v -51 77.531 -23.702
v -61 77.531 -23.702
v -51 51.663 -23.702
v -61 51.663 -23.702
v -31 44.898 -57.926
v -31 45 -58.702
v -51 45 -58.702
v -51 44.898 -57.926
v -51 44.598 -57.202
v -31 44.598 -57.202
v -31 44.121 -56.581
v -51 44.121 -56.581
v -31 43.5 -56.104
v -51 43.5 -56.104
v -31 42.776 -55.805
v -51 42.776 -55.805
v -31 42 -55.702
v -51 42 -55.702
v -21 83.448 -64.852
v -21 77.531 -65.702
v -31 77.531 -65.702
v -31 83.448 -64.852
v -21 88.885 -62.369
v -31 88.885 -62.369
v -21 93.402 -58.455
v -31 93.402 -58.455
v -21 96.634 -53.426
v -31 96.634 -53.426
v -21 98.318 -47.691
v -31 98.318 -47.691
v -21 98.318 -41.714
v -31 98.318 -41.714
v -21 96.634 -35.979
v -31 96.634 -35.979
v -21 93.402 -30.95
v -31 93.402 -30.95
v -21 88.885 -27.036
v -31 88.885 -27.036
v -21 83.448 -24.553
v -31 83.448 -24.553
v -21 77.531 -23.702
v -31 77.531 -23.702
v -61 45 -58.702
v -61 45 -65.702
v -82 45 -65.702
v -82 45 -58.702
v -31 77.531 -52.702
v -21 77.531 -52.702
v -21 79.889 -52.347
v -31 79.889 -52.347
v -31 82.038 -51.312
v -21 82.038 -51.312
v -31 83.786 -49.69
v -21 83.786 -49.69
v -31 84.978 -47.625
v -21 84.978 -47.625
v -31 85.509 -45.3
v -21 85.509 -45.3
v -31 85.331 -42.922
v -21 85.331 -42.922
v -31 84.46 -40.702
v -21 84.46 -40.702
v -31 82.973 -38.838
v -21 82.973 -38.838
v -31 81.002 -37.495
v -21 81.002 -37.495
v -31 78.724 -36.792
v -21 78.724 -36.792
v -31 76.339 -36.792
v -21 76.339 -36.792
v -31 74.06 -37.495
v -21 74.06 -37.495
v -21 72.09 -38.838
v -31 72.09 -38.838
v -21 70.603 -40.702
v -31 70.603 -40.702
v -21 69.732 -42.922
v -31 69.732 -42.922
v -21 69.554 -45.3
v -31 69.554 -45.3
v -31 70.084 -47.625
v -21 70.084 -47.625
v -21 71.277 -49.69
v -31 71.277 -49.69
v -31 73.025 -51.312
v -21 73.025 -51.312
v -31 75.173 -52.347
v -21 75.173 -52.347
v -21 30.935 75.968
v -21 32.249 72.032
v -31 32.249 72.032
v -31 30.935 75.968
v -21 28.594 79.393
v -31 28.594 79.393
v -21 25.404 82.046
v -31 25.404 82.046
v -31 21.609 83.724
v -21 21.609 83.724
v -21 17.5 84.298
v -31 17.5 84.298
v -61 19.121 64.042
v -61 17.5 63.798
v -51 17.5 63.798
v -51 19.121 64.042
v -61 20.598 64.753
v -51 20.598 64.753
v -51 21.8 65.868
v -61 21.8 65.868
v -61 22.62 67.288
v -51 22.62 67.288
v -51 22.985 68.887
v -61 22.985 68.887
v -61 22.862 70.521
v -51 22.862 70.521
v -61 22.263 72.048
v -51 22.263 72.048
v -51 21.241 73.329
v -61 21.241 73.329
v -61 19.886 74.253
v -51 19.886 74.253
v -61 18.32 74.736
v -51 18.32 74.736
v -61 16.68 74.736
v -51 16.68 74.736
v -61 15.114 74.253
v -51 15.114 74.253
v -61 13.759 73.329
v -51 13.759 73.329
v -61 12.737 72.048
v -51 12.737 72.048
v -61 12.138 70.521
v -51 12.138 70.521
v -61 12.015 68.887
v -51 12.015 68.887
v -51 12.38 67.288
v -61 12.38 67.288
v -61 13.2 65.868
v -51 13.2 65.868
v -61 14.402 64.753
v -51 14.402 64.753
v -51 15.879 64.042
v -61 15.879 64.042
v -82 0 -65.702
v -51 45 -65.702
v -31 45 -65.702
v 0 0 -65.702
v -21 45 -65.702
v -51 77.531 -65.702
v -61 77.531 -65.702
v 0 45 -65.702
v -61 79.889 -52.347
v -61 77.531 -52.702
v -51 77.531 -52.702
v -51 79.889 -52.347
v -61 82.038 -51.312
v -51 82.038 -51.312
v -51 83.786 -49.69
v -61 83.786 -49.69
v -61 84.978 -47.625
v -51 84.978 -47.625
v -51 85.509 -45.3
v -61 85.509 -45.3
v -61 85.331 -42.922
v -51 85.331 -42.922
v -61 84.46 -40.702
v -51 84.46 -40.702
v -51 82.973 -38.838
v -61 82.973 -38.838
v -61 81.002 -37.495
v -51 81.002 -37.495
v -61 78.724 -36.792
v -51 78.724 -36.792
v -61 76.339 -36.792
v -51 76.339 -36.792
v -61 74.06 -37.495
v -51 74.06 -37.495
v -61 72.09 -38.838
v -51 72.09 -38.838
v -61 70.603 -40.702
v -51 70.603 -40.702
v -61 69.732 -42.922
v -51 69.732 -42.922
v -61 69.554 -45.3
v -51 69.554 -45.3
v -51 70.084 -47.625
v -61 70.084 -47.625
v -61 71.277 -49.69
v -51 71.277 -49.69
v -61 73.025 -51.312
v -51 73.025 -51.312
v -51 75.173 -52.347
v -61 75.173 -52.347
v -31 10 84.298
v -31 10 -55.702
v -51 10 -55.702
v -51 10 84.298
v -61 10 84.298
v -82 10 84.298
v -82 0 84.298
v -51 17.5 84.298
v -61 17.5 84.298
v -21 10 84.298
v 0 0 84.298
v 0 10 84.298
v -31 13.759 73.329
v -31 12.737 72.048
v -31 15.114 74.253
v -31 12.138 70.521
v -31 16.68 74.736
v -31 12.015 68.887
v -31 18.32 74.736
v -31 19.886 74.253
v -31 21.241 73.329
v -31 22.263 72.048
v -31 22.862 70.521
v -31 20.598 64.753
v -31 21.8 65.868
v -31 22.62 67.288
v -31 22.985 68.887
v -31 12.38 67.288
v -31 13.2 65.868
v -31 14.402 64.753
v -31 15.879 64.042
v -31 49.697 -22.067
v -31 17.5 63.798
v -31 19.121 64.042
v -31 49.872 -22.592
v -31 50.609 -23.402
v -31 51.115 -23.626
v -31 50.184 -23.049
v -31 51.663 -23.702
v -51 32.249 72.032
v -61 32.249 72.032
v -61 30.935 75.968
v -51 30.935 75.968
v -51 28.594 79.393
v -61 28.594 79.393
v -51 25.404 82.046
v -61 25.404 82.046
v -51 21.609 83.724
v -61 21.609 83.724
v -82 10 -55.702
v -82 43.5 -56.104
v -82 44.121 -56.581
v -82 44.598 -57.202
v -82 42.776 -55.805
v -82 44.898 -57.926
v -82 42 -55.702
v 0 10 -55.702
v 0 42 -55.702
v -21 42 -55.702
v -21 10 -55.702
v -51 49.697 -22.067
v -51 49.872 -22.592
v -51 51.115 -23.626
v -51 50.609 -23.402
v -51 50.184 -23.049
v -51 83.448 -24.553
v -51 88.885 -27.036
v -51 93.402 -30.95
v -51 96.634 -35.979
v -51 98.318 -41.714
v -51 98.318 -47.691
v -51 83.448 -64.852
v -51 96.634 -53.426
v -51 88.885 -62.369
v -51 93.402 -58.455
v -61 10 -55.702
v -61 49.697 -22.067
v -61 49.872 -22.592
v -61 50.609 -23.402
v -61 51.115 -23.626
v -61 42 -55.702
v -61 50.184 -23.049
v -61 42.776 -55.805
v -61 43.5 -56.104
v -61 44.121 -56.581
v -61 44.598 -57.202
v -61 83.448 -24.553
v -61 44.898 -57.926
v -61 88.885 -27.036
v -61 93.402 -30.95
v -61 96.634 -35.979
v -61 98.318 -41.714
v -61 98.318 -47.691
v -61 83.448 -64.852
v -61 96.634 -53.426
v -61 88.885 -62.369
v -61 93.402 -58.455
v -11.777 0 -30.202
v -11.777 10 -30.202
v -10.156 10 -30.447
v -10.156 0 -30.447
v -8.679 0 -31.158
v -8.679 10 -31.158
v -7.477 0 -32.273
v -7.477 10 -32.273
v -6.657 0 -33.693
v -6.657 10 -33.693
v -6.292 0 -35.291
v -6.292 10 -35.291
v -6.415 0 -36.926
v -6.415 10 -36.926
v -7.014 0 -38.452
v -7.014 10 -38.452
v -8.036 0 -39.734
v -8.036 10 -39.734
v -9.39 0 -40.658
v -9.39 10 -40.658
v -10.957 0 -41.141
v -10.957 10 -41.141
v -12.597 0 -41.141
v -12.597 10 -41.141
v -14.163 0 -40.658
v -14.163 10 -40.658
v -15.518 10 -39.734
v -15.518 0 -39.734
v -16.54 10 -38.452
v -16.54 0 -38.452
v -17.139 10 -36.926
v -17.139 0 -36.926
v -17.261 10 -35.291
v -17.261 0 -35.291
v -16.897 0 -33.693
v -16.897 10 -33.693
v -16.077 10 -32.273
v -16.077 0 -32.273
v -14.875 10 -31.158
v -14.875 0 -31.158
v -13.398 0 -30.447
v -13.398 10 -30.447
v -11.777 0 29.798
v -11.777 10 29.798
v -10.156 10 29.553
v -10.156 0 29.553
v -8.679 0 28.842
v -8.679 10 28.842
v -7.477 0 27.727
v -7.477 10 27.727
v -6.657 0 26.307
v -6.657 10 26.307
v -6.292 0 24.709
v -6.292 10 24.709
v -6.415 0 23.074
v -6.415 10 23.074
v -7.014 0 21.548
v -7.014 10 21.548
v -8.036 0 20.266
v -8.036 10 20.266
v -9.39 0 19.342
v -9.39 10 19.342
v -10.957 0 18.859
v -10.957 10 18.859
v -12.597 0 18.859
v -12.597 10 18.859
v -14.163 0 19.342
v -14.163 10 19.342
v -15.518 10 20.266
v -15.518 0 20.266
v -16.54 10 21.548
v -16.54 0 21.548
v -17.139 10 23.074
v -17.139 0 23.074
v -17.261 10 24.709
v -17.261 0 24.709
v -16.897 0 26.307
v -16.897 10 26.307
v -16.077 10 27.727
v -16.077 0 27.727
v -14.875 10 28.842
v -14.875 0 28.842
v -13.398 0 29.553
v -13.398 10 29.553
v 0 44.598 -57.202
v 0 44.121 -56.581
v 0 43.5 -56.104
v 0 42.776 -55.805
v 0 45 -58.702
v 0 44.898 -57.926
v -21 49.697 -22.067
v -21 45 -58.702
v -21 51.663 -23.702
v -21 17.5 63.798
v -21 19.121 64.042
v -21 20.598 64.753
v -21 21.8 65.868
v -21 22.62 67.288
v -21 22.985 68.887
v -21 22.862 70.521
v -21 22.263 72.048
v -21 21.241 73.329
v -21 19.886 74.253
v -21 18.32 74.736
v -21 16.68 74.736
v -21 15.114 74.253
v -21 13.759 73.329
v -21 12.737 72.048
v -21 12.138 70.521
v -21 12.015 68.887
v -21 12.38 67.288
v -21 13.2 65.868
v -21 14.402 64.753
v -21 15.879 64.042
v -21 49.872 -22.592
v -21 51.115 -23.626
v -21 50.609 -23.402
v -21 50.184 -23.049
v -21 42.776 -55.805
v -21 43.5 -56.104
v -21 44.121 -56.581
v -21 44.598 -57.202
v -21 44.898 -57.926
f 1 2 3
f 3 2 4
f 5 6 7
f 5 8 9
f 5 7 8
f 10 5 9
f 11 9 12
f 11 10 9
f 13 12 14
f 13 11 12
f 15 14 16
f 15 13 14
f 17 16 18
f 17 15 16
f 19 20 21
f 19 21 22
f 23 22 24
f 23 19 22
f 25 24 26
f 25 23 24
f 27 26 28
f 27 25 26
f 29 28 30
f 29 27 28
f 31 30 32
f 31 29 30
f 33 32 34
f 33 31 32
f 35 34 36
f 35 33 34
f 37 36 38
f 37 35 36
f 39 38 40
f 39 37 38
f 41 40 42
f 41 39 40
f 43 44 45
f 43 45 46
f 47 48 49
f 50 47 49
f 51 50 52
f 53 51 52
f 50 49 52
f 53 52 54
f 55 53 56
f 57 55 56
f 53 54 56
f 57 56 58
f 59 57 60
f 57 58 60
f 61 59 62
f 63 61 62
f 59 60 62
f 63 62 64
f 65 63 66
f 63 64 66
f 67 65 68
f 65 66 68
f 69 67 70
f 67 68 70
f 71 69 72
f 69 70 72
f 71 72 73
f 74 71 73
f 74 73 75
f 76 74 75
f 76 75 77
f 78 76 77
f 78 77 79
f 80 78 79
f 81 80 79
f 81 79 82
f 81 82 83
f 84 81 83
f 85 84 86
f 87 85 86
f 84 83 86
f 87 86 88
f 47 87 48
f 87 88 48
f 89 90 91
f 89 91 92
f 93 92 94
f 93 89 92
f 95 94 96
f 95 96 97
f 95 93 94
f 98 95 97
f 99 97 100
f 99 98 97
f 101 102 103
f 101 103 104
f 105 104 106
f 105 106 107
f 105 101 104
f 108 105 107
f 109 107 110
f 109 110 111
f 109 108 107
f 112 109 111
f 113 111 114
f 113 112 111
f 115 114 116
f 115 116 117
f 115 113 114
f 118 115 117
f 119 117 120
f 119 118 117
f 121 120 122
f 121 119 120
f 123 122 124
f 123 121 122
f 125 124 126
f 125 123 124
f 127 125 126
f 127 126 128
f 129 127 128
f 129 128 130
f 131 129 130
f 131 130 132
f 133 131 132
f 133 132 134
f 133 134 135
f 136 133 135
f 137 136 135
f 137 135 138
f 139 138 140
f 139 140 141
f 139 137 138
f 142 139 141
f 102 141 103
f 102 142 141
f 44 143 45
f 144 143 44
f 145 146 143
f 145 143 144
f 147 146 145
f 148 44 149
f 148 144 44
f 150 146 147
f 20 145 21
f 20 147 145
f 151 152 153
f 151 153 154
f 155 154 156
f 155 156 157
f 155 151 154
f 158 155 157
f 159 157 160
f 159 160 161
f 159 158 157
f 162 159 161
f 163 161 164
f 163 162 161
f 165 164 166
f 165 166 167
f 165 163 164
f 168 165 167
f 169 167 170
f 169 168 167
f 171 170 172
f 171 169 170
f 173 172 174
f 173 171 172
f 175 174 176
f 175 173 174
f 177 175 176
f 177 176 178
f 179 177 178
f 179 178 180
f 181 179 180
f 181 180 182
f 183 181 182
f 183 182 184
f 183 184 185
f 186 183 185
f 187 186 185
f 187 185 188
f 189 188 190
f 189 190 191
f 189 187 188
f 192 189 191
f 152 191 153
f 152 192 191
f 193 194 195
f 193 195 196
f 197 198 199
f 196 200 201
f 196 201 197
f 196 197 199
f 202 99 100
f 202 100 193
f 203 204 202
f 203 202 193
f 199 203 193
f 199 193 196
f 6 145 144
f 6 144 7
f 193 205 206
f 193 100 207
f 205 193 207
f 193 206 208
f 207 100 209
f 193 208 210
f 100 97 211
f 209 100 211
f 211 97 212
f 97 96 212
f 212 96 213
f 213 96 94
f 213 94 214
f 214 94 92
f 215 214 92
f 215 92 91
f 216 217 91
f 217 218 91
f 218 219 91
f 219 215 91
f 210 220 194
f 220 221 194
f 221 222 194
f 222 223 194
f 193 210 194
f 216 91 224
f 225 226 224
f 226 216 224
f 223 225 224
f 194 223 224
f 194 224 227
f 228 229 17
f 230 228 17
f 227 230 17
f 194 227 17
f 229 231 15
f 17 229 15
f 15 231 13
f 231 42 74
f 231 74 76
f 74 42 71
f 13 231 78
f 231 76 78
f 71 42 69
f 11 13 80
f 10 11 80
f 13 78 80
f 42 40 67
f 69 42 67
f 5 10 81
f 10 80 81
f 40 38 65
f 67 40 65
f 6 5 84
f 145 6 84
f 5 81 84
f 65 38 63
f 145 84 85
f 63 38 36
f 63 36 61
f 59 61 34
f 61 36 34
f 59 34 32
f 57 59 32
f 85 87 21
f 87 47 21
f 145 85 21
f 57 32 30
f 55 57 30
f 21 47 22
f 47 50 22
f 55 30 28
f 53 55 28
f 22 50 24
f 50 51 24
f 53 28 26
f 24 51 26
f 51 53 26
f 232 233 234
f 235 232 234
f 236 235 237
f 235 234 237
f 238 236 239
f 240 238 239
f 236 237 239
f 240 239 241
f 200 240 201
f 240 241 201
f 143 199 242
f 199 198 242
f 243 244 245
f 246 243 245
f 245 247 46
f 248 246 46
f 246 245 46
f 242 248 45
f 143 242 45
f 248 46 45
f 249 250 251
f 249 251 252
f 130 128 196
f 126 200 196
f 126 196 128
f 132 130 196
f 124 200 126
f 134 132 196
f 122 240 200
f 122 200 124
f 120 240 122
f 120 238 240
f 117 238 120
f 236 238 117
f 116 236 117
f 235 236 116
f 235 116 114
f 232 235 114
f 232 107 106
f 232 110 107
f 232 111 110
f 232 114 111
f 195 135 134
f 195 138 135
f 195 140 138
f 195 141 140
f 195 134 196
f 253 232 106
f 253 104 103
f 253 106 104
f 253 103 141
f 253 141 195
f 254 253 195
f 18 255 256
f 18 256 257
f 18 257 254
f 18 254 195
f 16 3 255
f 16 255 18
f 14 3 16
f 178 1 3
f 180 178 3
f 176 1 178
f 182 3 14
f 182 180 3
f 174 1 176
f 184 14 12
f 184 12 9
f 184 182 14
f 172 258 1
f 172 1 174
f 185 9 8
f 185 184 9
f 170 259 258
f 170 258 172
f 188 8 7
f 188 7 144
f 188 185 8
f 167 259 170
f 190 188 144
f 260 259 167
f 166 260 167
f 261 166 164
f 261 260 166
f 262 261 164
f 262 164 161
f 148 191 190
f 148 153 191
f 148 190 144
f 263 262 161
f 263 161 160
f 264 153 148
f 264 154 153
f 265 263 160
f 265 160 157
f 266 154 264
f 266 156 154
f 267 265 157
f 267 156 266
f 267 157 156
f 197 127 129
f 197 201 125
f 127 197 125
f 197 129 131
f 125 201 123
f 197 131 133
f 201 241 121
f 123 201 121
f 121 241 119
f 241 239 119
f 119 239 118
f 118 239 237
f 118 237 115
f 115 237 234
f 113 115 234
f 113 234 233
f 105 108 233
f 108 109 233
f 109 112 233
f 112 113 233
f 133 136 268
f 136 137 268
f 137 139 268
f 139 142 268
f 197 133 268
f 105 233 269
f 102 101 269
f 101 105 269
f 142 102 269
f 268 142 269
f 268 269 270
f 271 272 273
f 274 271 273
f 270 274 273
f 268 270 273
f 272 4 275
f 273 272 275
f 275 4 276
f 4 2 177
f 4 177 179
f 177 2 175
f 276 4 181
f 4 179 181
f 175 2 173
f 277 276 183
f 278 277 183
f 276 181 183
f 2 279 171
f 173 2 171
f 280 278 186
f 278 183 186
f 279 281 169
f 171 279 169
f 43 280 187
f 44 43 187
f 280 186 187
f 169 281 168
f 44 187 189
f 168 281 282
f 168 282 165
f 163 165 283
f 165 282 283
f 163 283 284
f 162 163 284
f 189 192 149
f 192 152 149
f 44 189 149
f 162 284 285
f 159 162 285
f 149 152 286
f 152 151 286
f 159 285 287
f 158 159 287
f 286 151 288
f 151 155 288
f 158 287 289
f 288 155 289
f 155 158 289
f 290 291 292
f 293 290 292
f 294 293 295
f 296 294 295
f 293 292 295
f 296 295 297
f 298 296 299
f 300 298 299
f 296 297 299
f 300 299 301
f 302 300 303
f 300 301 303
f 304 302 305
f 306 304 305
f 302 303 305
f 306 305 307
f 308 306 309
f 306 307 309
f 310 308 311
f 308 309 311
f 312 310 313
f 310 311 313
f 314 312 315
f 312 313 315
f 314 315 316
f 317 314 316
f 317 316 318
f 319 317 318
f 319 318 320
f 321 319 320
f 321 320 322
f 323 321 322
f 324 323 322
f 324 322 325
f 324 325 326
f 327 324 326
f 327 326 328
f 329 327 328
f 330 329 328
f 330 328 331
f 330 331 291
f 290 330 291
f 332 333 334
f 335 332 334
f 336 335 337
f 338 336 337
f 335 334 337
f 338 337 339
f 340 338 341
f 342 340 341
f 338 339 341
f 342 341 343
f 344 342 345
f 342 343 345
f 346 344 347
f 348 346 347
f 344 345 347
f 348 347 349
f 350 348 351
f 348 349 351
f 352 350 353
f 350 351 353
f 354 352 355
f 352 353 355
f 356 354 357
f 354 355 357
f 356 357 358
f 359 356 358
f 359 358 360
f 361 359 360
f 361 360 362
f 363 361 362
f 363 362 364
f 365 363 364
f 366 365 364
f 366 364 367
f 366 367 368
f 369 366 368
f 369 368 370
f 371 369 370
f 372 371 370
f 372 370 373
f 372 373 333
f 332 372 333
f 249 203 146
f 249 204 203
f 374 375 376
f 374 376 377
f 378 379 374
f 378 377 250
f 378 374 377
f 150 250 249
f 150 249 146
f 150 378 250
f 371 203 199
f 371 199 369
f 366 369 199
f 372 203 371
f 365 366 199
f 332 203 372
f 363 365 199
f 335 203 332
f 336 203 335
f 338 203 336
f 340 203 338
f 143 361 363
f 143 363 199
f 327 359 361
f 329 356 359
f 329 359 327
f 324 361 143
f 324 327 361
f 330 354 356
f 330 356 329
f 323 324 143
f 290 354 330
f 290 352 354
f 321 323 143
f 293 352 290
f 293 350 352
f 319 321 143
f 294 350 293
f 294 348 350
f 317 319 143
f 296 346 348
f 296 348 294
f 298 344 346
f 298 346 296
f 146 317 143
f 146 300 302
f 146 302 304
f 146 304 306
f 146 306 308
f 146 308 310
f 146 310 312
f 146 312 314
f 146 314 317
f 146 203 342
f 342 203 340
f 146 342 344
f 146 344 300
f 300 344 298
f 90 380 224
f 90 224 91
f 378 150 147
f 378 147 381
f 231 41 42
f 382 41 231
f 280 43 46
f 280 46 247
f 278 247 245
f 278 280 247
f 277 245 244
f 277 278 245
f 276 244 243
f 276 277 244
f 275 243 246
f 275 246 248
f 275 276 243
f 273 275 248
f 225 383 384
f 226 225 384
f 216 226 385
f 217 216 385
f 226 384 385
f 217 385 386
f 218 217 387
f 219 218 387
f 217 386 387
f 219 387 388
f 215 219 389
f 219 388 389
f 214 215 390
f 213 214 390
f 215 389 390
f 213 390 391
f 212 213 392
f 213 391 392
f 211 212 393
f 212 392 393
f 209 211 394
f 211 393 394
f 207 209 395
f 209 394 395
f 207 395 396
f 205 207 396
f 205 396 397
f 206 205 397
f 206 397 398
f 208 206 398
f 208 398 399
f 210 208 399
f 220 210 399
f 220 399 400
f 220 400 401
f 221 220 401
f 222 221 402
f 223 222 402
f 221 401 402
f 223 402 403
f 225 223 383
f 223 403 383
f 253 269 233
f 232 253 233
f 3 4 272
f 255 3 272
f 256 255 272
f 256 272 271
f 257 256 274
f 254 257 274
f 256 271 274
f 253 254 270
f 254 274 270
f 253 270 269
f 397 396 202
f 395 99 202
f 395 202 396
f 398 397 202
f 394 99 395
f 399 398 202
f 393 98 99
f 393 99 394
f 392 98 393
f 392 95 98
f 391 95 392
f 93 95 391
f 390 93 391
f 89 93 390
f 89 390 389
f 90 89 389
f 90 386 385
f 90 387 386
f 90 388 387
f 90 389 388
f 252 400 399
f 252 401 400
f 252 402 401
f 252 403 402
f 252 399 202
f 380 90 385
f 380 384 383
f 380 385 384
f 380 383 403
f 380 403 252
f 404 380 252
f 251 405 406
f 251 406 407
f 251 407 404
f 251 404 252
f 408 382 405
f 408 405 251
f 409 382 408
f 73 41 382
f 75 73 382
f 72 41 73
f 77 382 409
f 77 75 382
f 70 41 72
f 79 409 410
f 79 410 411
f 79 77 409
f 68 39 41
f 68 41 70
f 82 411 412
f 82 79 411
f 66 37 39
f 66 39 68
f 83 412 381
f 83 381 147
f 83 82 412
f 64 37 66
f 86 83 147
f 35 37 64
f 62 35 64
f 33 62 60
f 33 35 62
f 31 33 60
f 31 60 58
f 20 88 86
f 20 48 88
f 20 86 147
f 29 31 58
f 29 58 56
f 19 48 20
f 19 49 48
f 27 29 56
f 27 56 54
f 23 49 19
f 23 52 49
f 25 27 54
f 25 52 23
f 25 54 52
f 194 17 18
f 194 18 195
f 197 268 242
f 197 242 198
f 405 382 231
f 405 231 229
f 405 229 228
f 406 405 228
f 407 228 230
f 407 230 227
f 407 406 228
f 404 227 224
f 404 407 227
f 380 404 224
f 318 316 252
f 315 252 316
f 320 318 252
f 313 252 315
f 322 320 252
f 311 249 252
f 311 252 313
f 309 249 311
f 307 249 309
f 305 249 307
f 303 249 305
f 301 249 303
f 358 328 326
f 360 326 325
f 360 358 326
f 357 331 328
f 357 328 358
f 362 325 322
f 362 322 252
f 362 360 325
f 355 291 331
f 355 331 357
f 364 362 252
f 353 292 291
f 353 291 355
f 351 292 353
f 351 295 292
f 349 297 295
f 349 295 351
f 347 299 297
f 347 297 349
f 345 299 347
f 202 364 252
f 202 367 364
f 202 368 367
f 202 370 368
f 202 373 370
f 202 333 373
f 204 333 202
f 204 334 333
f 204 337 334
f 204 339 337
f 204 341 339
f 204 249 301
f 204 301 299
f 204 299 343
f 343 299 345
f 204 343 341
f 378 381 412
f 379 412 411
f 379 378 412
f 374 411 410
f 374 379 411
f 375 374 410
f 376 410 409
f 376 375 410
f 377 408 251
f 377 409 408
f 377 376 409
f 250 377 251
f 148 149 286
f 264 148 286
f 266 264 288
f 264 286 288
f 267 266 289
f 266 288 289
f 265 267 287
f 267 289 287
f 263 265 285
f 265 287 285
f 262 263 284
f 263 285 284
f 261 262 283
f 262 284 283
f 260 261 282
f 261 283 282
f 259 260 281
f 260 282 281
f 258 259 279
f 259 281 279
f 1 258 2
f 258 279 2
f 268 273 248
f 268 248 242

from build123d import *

# Parameters (mm, degrees)
BOSS_EXTRUDE1_DEPTH = 82
SKETCH2_R           = 8
SKETCH2_R_2         = 5.5
BOSS_EXTRUDE2_DEPTH = 10
SKETCH3_R           = 5.5
CUT_EXTRUDE1_DEPTH  = 148.200134968


with BuildPart() as part:
    # Sketch1 → Boss-Extrude1 (new body)
    with BuildSketch(Plane(origin=(0, 0, 0), x_dir=(0, 0, -1), z_dir=(1, 0, 0))):
        with BuildLine():
            Line((-84.297520661, 0), (65.702479339, 0))
            Line((65.702479339, 0), (65.702479339, 45))
            Line((65.702479339, 45), (58.702479339, 45))
            ThreePointArc((58.702479339, 45), (56.581158995, 44.121320344), (55.702479339, 42))
            Line((55.702479339, 42), (55.702479339, 10))
            Line((55.702479339, 10), (-84.297520661, 10))
            Line((-84.297520661, 10), (-84.297520661, 0))
        make_face()
    extrude(amount=-BOSS_EXTRUDE1_DEPTH)

    # Sketch2 → Boss-Extrude2 (add)
    with BuildSketch(Plane(origin=(-21, 0, 0), x_dir=(0, 0, -1), z_dir=(1, 0, 0))):
        with BuildLine():
            Line((65.702479339, 45), (65.702479339, 77.531394121))
            ThreePointArc((65.702479339, 77.531394121), (44.702479339, 98.531394121), (23.702479339, 77.531394121))
            Line((23.702479339, 77.531394121), (23.702479339, 51.663245522))
            ThreePointArc((23.702479339, 51.663245522), (23.240214757, 50.384429748), (22.067109554, 49.696765213))
            Line((22.067109554, 49.696765213), (-72.032247278, 32.248602318))
            ThreePointArc((-72.032247278, 32.248602318), (-80.830536296, 27.091118307), (-84.297520661, 17.5))
            Line((-84.297520661, 17.5), (-84.297520661, 10))
            Line((-84.297520661, 10), (55.702479339, 10))
            Line((55.702479339, 10), (55.702479339, 42))
            ThreePointArc((55.702479339, 42), (56.581158995, 44.121320344), (58.702479339, 45))
            Line((58.702479339, 45), (65.702479339, 45))
        make_face()
        with Locations((44.702479339, 77.531394121)):
            Circle(SKETCH2_R, mode=Mode.SUBTRACT)
        with Locations((-69.297520661, 17.5)):
            Circle(SKETCH2_R_2, mode=Mode.SUBTRACT)
    extrude(amount=-BOSS_EXTRUDE2_DEPTH)

    # Mirror1: part across plane


with BuildPart() as part_1:
    add(part.part)
    add(part.part.mirror(Plane(origin=(-41, 0, 0), x_dir=(0, 0, 1), z_dir=(1, 0, 0))))

    # Sketch3 → Cut-Extrude1 (cut, through all)
    with BuildSketch(Plane(origin=(0, 10, 0), x_dir=(1, 0, 0), z_dir=(0, 1, 0))):
        with Locations(Location((-11.776828818, -24.297520661, 0), (0, 0, 270))):
            Circle(SKETCH3_R)
        with Locations(Location((-11.776828818, 35.702479339, 0), (0, 0, 270))):
            Circle(SKETCH3_R)
    extrude(amount=-CUT_EXTRUDE1_DEPTH, mode=Mode.SUBTRACT)


solid = part_1.part
